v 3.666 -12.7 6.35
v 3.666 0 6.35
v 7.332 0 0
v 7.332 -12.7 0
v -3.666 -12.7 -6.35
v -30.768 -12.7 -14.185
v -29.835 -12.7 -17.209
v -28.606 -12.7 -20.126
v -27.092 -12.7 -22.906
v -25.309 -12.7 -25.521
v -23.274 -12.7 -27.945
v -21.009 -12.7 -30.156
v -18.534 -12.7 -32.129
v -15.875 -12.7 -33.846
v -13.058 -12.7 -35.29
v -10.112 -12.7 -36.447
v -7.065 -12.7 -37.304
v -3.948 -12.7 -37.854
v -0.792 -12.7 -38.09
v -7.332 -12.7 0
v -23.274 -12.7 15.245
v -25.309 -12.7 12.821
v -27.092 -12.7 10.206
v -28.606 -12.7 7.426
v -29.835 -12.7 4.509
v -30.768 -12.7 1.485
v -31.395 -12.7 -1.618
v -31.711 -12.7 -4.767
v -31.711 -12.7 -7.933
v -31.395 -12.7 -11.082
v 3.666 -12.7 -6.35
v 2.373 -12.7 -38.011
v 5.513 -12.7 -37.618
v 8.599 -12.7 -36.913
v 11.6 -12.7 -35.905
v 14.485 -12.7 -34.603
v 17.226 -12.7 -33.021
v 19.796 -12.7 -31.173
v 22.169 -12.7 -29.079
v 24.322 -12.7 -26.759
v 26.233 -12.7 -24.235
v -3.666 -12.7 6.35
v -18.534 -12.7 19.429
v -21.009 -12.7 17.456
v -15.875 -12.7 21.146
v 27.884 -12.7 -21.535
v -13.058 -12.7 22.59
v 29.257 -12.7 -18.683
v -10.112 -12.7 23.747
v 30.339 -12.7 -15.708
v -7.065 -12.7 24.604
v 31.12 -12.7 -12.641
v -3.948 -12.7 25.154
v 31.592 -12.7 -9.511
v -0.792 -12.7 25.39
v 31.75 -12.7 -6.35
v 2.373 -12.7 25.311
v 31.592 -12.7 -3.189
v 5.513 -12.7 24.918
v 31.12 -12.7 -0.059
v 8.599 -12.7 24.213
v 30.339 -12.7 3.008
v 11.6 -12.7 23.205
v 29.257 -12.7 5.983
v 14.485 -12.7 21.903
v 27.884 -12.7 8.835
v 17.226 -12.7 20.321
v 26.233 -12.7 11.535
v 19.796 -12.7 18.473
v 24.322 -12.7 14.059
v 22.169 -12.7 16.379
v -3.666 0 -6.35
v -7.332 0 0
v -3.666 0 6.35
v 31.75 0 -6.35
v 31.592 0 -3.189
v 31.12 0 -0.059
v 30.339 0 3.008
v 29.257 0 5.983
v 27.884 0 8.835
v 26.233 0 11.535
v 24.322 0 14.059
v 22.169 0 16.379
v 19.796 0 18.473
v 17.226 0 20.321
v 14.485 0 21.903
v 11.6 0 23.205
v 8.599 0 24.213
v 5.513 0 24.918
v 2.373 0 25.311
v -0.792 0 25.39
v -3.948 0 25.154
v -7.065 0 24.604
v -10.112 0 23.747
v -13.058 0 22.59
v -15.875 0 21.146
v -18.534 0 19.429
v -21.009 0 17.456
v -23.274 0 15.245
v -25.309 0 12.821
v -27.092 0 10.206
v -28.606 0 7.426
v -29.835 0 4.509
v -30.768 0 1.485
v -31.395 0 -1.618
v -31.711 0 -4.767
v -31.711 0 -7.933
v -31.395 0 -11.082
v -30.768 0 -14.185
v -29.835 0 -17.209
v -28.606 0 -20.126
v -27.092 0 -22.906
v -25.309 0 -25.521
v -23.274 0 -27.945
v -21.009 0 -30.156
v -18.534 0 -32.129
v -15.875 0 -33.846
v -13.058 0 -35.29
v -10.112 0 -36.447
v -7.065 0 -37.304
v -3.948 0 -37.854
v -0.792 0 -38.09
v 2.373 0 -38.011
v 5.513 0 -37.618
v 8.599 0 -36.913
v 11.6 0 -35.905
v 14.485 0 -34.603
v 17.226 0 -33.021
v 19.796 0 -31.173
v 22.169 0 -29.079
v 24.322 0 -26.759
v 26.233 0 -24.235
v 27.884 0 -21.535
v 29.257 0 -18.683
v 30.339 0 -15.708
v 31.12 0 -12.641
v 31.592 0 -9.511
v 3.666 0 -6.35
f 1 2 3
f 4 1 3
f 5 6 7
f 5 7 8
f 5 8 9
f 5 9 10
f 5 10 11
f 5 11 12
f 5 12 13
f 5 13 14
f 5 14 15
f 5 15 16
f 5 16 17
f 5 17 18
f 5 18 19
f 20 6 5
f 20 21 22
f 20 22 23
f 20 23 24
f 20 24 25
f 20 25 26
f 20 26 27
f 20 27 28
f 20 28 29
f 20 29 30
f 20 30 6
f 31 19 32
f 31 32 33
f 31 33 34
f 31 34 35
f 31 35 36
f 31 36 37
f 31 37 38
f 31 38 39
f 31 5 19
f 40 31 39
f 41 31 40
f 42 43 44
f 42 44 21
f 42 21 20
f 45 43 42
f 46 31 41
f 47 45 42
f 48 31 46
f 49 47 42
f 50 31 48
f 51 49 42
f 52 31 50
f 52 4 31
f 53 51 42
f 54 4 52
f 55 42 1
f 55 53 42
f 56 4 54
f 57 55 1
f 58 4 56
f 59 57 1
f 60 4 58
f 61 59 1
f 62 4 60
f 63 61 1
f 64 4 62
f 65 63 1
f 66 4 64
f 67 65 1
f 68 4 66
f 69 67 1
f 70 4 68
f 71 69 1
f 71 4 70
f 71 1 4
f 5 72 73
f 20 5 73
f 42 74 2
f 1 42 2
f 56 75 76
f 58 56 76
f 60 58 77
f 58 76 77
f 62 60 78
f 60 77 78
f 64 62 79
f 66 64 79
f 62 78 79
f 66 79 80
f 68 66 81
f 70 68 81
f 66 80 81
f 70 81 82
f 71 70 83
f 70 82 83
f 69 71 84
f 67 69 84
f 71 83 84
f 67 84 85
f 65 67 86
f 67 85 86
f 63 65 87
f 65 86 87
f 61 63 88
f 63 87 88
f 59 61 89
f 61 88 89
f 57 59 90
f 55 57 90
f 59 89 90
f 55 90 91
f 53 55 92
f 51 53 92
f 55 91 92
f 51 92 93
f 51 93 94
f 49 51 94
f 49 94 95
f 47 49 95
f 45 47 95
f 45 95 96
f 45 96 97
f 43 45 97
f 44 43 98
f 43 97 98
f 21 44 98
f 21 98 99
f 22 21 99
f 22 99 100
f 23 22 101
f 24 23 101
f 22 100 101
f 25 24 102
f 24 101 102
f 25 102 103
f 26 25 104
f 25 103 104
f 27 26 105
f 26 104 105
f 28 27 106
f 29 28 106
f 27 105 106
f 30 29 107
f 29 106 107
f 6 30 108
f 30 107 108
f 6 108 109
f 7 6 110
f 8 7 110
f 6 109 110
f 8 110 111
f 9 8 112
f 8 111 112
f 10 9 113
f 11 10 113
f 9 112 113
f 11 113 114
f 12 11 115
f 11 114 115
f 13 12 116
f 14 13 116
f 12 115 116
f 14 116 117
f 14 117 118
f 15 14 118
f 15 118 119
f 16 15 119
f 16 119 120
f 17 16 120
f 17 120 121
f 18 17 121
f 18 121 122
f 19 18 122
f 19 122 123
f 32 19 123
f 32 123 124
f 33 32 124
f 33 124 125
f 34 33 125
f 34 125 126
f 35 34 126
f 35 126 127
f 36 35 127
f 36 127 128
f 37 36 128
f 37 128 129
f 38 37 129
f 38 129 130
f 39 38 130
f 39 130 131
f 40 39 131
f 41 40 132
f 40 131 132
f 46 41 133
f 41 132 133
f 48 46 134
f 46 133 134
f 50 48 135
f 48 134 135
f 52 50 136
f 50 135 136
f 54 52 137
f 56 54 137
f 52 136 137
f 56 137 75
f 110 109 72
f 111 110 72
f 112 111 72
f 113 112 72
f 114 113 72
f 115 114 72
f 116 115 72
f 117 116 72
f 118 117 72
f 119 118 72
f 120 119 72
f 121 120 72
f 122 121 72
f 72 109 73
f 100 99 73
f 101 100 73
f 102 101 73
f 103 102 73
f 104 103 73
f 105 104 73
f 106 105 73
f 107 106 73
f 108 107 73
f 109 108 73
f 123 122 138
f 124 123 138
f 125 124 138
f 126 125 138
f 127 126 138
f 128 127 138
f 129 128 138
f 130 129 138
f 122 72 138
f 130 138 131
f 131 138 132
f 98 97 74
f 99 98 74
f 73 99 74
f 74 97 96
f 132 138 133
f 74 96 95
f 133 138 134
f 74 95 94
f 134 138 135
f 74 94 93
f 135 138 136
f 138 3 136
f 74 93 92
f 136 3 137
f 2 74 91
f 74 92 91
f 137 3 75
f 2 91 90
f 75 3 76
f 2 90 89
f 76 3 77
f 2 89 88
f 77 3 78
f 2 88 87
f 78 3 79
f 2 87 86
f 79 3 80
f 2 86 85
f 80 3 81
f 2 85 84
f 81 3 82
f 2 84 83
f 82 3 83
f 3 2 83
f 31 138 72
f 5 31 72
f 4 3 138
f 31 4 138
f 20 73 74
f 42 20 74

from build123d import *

# Parameters (mm, degrees)
F0_R     = 31.75
F1_DEPTH = 12.7


with BuildPart() as f1:
    # F0 (on Front) → F1 (new body)
    with BuildSketch(Plane.XZ):
        with Locations((0, -6.35)):
            Circle(F0_R)
        Polygon((-3.666174, -6.35), (-7.332348, 0), (-3.666174, 6.35), (3.666174, 6.35), (7.332348, 0), (3.666174, -6.35), align=None, mode=Mode.SUBTRACT)
    extrude(amount=F1_DEPTH)


solid = f1.part
